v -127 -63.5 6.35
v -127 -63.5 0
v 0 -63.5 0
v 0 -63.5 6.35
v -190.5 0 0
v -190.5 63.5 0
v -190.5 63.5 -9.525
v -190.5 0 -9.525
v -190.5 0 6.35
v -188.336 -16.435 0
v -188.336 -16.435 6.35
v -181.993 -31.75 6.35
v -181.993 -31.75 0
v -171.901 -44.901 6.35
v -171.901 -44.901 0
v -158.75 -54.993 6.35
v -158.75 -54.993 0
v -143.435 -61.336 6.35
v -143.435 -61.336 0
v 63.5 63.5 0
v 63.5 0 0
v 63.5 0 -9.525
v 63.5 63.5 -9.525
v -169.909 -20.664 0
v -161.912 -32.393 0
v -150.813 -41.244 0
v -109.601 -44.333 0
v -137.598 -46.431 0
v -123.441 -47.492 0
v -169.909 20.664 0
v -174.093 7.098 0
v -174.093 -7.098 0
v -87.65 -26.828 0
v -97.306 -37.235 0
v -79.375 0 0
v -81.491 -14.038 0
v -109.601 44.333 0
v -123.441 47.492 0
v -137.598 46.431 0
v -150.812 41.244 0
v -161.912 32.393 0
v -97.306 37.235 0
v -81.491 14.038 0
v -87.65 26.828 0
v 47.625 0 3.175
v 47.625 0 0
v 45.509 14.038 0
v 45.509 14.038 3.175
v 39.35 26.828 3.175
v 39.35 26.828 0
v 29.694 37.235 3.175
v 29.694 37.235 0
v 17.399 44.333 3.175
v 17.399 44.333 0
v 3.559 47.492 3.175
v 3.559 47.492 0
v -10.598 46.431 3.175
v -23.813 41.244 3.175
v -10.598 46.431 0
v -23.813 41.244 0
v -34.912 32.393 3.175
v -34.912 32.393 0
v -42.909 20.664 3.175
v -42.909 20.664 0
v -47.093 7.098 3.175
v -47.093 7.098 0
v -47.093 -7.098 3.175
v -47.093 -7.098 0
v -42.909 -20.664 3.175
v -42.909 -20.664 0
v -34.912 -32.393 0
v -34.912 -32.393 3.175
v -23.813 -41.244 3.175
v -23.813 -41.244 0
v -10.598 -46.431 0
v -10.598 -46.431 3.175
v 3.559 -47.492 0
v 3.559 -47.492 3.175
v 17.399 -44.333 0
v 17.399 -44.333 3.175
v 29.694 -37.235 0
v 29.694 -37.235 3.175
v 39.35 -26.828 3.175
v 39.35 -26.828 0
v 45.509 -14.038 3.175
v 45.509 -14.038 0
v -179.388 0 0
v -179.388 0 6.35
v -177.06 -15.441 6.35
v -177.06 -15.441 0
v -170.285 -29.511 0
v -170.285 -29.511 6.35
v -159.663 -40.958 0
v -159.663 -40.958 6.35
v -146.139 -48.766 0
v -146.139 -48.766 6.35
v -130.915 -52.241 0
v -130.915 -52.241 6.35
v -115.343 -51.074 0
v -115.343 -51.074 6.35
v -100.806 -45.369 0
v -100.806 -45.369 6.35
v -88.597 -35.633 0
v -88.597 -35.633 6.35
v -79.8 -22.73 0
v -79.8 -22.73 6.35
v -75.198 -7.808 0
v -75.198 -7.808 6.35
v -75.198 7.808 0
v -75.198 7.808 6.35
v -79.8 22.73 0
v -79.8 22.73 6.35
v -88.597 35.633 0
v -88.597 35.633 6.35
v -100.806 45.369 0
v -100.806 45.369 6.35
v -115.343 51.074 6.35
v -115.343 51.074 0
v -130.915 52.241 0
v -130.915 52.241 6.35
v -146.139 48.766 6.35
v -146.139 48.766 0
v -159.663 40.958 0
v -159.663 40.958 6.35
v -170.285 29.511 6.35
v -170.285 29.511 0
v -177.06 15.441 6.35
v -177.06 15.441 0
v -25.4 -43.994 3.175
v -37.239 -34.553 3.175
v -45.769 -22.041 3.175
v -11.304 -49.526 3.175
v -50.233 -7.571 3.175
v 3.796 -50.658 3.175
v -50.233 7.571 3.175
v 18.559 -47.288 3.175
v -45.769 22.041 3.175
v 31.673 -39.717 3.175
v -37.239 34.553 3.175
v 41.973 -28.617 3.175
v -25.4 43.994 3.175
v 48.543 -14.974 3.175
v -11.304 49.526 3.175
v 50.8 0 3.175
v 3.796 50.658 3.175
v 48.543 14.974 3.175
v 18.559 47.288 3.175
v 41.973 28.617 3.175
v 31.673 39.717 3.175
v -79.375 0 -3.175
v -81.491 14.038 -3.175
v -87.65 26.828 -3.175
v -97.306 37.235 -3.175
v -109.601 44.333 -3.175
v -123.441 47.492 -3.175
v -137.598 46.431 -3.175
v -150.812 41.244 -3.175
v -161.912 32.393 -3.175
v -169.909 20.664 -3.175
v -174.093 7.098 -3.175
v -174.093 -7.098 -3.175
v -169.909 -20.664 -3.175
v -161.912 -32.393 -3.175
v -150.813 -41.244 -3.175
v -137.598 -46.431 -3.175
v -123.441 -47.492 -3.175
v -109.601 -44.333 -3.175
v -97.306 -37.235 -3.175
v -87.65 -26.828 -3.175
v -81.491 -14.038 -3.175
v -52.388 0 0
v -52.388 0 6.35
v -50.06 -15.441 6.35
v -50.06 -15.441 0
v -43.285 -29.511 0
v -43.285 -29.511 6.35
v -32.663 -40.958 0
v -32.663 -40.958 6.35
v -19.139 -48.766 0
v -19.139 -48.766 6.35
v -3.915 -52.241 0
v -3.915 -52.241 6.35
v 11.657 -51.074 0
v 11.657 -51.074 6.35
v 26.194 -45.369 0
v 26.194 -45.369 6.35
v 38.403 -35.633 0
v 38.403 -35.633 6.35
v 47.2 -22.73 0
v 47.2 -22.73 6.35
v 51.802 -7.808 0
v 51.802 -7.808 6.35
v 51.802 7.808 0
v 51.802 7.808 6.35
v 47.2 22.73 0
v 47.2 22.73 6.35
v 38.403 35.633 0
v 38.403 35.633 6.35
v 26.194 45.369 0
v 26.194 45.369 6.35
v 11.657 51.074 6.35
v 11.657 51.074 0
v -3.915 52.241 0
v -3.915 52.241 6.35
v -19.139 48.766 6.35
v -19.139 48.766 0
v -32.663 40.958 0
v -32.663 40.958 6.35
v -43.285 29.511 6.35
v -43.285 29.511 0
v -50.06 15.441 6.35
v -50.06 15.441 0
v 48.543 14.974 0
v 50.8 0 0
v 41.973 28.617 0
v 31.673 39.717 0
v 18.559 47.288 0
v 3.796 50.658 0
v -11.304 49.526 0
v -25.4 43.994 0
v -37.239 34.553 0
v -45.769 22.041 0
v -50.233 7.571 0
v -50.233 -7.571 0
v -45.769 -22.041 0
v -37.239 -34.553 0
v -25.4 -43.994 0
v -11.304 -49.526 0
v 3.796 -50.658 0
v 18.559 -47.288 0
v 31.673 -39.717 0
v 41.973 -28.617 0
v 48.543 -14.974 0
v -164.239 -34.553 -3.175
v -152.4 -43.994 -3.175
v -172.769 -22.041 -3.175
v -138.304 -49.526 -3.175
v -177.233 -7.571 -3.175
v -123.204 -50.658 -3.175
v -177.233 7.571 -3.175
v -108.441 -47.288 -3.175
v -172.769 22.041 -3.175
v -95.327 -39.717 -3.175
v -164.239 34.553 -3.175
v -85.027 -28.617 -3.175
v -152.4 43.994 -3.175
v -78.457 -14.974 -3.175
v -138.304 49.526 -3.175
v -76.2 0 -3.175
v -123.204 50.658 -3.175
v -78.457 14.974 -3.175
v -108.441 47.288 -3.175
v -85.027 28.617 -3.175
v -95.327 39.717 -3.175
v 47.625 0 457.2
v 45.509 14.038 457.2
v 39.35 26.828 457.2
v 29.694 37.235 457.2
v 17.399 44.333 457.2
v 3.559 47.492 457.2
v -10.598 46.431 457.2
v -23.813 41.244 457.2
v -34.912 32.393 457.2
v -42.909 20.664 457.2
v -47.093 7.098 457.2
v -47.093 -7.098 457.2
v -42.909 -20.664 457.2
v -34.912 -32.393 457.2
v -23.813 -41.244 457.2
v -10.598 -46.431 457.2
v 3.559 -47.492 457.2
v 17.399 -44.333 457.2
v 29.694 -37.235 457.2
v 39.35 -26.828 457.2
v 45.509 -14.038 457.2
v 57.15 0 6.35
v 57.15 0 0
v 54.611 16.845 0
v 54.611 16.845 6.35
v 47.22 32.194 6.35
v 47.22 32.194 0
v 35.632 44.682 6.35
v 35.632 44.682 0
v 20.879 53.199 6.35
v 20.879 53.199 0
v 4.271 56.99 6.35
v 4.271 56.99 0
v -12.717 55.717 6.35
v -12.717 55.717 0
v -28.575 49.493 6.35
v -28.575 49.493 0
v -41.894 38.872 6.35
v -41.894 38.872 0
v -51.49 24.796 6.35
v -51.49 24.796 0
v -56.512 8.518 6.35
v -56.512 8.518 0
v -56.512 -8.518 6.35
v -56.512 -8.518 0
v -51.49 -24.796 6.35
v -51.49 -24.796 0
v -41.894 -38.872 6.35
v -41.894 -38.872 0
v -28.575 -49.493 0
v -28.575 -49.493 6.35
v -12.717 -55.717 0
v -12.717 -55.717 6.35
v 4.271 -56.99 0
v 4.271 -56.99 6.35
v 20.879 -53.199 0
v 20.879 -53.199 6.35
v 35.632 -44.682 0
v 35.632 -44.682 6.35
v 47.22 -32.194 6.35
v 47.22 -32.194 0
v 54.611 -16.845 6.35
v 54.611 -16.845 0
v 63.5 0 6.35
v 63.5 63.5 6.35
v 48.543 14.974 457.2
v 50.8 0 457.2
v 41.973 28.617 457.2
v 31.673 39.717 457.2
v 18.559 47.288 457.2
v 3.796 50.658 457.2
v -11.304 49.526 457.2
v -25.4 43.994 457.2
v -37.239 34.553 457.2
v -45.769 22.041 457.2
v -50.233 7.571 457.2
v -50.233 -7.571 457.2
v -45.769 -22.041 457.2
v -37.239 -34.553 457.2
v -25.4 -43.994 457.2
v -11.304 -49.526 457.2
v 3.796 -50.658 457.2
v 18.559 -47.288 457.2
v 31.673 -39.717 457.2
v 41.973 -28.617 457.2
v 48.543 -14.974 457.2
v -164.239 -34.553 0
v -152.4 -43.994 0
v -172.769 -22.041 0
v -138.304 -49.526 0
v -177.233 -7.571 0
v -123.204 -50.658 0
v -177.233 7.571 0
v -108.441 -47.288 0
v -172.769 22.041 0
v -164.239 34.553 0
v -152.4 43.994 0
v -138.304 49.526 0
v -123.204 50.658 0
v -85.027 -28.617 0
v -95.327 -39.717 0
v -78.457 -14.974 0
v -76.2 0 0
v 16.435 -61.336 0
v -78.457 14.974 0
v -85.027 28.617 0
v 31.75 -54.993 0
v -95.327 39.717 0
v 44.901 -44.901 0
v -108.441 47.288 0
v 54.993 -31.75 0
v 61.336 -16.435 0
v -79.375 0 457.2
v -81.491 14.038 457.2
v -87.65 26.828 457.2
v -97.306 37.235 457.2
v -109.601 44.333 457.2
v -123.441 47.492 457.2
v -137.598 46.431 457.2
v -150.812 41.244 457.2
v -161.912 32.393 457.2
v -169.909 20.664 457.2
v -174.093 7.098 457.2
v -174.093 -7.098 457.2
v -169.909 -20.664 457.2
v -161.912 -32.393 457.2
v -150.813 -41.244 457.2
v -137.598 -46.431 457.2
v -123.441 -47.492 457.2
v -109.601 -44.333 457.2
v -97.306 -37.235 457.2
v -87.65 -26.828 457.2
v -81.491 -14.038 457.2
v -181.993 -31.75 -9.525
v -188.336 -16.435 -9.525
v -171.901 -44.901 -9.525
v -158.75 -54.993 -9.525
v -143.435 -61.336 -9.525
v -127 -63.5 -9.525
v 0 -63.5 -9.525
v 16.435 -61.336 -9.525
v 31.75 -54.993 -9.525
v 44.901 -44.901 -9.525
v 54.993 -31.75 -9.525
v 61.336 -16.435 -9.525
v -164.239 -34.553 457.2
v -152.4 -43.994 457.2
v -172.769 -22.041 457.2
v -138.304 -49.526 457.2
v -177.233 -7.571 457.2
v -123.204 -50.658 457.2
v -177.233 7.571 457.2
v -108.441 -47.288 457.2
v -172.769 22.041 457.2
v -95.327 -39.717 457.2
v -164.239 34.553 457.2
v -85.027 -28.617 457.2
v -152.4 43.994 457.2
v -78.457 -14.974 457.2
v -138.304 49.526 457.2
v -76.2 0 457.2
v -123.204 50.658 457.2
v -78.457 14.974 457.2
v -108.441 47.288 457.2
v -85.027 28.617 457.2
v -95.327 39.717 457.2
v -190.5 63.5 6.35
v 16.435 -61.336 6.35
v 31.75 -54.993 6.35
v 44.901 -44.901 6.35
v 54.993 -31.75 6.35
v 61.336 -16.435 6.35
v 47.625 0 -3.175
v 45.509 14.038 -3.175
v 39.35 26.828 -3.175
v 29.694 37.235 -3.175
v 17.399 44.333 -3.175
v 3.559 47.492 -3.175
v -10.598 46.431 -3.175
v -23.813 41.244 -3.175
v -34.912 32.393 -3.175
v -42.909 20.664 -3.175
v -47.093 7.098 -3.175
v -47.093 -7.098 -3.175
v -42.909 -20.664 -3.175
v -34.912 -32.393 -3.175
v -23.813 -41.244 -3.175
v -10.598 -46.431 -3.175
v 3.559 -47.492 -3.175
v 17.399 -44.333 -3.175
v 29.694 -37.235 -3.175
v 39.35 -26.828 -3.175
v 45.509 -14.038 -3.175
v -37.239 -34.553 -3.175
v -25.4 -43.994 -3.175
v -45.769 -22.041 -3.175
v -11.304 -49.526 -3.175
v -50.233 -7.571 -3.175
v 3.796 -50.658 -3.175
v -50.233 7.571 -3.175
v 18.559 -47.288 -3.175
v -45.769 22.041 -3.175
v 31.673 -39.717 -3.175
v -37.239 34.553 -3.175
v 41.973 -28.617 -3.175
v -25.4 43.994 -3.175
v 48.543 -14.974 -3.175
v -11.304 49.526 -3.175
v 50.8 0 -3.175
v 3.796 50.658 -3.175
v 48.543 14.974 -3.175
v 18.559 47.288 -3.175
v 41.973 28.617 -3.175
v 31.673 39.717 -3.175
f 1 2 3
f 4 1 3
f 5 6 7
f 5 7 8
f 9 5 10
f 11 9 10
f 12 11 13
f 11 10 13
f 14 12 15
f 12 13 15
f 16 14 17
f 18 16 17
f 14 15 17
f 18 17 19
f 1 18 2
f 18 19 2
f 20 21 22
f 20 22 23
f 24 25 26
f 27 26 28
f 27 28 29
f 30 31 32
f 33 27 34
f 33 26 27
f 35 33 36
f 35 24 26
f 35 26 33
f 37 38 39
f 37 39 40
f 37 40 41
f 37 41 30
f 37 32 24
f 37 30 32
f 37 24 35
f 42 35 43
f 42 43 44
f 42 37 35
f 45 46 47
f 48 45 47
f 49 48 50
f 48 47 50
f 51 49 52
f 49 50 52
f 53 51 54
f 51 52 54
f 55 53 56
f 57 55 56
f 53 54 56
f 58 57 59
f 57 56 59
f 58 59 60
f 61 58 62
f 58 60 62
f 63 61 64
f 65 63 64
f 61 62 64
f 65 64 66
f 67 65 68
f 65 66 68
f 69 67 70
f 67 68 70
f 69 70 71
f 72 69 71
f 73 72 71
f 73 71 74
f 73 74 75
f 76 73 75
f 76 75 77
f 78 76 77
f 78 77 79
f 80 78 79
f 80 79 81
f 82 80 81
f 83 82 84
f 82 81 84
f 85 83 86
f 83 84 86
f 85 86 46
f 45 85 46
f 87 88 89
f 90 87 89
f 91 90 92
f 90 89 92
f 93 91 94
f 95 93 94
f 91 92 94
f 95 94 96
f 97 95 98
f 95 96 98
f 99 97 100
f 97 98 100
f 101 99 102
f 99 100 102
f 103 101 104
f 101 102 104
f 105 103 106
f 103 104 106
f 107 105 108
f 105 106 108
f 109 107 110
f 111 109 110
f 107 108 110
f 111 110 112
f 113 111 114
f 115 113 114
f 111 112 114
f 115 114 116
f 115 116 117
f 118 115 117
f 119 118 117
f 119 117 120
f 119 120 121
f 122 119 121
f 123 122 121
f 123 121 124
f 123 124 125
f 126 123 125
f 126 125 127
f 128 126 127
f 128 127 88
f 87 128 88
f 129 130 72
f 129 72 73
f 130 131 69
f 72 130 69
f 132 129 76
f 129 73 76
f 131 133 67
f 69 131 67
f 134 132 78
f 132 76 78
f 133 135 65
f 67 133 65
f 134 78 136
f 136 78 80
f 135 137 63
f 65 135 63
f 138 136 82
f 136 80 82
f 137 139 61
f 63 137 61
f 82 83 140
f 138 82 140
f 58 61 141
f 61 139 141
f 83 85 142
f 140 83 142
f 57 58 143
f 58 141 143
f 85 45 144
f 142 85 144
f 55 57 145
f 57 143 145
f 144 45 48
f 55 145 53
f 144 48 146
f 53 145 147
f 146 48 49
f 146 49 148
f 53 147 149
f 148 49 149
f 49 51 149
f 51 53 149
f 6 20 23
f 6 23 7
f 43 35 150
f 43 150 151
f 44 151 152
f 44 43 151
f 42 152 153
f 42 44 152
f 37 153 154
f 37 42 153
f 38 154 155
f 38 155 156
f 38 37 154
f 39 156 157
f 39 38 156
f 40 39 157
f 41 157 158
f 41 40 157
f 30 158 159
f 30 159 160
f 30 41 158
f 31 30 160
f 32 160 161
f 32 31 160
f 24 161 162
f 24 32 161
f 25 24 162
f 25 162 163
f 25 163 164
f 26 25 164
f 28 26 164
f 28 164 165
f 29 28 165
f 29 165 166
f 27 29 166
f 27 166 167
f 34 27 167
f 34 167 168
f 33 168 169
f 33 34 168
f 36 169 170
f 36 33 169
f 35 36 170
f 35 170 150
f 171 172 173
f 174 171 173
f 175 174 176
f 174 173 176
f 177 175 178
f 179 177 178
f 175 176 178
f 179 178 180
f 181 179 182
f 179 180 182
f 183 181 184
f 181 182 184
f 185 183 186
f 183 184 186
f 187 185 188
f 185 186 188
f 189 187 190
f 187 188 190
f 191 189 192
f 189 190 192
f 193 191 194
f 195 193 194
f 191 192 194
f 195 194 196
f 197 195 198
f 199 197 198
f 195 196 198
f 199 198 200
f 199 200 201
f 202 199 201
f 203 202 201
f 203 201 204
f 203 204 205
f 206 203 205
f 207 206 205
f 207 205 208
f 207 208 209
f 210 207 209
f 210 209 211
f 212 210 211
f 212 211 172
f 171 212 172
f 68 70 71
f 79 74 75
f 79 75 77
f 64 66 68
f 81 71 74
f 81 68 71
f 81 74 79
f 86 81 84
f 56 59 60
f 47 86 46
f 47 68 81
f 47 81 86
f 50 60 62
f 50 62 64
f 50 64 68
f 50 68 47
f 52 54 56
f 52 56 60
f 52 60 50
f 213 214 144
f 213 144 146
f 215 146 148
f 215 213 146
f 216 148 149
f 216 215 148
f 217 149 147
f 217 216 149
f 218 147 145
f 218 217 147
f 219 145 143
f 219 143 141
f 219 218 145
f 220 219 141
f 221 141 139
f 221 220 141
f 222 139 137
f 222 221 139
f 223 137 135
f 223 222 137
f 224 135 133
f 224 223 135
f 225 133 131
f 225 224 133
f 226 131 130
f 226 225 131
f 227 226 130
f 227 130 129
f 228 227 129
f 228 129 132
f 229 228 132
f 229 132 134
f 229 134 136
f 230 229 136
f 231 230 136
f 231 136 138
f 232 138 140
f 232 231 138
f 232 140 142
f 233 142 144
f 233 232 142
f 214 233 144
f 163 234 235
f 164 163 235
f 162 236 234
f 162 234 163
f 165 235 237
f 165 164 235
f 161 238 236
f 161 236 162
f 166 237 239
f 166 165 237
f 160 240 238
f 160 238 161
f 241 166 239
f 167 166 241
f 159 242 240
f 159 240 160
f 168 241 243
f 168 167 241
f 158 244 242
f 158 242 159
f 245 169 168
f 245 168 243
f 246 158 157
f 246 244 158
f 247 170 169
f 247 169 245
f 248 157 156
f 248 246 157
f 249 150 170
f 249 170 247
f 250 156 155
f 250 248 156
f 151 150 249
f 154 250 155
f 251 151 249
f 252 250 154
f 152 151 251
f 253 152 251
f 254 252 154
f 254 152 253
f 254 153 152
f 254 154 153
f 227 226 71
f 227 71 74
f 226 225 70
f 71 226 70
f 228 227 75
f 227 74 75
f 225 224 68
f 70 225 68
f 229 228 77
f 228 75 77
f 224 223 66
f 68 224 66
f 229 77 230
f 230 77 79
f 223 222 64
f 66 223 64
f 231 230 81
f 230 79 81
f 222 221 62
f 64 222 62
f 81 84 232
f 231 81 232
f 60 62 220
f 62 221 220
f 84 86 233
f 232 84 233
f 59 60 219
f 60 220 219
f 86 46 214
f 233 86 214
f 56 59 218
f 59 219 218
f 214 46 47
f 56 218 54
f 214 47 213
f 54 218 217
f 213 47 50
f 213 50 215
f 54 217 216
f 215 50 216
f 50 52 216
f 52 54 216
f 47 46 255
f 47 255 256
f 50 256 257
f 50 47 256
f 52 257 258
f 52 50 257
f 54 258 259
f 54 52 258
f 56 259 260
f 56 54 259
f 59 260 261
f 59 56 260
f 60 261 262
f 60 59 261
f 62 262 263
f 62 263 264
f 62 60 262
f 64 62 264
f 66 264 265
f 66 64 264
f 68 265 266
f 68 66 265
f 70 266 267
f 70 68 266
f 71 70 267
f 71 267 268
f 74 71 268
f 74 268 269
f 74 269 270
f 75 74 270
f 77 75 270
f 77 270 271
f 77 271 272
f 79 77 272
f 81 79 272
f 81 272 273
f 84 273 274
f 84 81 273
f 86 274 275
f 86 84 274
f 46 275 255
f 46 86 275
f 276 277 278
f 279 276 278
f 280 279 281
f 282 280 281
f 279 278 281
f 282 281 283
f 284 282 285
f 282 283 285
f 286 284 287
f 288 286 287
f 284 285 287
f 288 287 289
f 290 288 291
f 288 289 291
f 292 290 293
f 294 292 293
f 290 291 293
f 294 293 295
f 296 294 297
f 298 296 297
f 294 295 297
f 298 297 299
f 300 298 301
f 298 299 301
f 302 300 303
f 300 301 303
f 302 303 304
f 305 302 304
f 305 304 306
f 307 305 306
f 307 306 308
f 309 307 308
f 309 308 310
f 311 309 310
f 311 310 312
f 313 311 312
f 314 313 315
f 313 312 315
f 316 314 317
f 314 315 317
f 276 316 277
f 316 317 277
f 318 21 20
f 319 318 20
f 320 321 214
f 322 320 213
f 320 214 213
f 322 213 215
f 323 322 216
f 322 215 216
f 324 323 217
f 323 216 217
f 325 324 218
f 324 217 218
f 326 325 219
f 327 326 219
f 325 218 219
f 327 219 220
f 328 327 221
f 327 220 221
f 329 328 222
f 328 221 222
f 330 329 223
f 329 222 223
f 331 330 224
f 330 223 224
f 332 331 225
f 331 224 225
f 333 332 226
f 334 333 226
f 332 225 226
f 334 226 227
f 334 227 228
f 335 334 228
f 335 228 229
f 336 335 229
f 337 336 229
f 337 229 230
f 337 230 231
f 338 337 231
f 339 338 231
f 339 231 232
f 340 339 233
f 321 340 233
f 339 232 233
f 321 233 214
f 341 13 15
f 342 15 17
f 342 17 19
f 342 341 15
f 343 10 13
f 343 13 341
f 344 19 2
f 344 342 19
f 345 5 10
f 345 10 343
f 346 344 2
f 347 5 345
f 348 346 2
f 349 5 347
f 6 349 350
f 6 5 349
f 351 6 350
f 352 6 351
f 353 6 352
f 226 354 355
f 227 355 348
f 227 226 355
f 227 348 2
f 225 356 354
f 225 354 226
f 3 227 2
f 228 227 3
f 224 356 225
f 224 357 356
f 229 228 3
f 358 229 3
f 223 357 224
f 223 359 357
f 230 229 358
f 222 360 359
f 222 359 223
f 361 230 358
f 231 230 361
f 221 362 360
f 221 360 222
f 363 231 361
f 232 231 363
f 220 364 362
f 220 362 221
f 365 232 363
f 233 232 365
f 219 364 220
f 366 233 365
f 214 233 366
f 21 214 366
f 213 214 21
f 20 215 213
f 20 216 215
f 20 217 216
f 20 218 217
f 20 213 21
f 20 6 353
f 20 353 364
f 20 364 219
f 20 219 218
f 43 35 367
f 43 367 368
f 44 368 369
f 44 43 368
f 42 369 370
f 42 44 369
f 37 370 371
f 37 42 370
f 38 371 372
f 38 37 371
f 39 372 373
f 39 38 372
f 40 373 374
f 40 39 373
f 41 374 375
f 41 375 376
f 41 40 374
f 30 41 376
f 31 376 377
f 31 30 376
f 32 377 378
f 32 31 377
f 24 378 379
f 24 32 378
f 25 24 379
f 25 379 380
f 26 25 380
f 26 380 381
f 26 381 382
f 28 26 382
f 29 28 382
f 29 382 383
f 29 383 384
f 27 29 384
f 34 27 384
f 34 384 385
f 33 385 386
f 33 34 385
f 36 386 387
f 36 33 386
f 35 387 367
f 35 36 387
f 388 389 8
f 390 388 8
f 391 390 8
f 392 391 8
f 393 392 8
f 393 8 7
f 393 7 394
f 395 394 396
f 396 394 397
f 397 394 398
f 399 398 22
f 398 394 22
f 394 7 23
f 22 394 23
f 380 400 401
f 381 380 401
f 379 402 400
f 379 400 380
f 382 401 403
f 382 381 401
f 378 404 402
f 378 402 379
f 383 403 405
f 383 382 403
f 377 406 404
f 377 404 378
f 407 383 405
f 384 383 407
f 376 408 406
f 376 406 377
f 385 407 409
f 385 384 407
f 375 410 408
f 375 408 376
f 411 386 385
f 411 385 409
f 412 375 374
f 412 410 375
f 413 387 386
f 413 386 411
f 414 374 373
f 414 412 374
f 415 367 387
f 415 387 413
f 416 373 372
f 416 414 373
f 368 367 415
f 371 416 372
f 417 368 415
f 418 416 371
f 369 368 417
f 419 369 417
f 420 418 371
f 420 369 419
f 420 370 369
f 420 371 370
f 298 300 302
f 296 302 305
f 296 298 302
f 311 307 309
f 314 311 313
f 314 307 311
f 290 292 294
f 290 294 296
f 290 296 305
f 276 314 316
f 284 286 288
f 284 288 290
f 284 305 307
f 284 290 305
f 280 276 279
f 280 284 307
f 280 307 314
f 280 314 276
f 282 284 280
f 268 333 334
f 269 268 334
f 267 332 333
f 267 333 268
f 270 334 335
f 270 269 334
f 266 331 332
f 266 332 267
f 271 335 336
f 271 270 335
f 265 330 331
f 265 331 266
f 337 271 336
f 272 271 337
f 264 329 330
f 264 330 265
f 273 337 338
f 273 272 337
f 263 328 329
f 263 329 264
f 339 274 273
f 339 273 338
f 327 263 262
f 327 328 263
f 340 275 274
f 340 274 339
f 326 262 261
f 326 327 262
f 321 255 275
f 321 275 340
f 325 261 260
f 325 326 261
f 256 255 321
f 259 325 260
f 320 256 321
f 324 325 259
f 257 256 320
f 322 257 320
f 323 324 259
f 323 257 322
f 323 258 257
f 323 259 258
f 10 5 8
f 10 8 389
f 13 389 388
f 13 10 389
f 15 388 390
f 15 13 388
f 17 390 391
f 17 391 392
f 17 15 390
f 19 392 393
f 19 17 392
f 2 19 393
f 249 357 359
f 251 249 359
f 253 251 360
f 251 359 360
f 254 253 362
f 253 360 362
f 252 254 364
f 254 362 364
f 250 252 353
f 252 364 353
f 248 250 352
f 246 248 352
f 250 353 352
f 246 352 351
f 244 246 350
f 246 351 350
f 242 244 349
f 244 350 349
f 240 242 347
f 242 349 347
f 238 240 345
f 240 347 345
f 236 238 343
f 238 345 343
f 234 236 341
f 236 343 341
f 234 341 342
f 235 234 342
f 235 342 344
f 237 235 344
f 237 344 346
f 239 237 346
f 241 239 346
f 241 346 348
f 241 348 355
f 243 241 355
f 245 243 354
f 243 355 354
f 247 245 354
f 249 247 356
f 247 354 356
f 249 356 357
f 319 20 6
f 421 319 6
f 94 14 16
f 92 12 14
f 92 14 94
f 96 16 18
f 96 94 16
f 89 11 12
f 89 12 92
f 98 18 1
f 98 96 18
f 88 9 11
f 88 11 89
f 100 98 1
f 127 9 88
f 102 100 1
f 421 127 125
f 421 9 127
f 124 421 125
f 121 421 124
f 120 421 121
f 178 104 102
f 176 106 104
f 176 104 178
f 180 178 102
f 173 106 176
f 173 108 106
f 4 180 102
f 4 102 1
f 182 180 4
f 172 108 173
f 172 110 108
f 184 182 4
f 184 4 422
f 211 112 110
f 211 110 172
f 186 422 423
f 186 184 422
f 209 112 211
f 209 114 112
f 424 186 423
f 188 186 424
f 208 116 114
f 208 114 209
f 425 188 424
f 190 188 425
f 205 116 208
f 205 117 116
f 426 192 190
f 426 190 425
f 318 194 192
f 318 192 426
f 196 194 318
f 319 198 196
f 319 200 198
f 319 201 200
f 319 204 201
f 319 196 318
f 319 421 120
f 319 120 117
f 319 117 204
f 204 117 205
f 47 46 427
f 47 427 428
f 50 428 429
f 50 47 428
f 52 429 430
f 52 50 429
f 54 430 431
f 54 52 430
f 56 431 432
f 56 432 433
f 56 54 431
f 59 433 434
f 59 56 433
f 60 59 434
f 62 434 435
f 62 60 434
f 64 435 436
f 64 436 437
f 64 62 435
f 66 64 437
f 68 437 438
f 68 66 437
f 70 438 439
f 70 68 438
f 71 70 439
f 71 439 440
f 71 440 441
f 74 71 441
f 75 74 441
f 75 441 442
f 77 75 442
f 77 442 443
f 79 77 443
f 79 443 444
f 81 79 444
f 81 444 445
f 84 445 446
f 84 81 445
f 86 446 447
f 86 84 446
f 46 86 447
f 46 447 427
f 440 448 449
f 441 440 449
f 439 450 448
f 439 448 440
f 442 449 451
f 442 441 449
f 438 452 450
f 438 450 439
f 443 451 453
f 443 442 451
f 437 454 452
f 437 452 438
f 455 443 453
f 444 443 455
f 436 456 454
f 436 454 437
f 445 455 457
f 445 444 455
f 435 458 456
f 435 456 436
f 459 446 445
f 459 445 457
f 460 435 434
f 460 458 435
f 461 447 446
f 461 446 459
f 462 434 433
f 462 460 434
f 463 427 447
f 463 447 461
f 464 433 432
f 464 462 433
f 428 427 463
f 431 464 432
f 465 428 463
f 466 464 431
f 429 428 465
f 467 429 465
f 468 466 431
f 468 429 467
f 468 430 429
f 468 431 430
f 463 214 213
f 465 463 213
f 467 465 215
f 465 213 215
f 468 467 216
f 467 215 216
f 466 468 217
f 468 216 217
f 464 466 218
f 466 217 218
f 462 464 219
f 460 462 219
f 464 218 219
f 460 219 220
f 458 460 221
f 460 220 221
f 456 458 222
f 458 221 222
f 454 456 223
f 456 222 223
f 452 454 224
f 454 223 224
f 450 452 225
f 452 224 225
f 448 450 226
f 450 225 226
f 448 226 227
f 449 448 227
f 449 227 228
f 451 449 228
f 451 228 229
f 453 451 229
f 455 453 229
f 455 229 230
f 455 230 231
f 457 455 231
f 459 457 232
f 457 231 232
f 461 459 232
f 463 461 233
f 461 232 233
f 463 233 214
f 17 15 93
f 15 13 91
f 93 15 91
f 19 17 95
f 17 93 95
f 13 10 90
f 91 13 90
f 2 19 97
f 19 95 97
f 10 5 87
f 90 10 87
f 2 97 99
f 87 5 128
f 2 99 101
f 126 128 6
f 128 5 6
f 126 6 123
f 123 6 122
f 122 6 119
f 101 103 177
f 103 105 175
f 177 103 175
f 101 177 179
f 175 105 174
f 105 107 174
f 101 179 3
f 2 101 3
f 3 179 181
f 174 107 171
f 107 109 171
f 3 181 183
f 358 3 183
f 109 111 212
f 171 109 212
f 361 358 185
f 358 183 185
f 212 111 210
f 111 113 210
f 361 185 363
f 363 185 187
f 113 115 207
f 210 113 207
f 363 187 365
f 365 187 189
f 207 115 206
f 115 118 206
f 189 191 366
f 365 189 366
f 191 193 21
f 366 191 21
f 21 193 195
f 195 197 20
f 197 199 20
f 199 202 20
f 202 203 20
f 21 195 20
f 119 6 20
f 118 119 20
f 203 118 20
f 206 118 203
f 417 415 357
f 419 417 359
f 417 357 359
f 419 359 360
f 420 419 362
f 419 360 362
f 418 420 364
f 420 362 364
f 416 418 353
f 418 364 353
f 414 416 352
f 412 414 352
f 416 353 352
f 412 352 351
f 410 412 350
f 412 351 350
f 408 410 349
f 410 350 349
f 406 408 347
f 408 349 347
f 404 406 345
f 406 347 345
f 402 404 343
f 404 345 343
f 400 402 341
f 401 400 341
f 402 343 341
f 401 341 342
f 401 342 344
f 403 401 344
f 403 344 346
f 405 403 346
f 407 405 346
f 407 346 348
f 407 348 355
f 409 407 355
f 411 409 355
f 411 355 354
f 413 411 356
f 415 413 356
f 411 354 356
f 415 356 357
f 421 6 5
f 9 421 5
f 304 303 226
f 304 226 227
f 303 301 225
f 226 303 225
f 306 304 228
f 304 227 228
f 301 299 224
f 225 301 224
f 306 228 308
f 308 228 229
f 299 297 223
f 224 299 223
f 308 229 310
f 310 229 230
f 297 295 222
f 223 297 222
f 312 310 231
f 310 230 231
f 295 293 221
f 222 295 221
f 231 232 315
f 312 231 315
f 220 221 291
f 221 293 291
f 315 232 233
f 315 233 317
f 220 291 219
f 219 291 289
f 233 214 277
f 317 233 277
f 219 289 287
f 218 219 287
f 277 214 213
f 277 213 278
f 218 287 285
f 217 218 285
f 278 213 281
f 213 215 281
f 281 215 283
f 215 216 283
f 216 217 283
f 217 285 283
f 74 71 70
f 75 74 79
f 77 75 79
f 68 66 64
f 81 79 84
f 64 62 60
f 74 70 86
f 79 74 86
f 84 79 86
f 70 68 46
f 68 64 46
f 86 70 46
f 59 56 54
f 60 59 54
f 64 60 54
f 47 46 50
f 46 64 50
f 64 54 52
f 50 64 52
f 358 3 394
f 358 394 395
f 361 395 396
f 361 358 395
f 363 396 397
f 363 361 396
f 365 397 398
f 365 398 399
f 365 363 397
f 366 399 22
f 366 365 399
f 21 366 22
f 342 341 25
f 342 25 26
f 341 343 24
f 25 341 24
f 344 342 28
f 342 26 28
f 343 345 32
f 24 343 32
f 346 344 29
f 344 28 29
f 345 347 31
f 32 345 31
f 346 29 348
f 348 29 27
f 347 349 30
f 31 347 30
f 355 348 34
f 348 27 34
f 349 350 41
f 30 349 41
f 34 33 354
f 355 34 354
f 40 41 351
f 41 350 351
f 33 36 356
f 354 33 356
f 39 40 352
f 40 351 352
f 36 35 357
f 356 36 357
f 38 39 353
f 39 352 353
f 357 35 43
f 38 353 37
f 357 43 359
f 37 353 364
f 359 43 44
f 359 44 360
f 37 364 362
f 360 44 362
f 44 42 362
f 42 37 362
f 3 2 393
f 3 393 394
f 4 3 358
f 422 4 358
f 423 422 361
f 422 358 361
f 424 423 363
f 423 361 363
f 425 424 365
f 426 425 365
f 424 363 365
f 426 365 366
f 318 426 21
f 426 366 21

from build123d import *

# Parameters (mm, degrees)
F0_R     = 57.15
F1_DEPTH = 6.35
F2_DEPTH = 25.4
F4_DEPTH = 9.525
F5_R     = 50.8
F5_R_2   = 47.625
F6_DEPTH = 457.2
F7_DEPTH = 3.175
F8_DEPTH = 3.175
F9_DEPTH = 6.35
F10_D    = 104.775


# Not quite as in the source:
# - a feature names something its author has since deleted; it is built from what else it names


with BuildPart() as f1:
    # F0 (on Top) → F1 (new body)
    with BuildSketch(Plane.XY):
        Circle(F0_R)
    extrude(amount=F1_DEPTH)

    # F2 (cut): a face of the model
    f2_faces = [f1.faces().sort_by_distance(p)[0] for p in [
        (0, 0, 6.35),
    ]]
    extrude(f2_faces, amount=F2_DEPTH, mode=Mode.SUBTRACT)

    # F5 (on Top) → F7 (cut)
    with BuildSketch(Plane.XY):
        Circle(F5_R)
        Circle(F5_R_2, mode=Mode.SUBTRACT)
        with Locations((-127, 0)):
            Circle(F5_R)
        with Locations((-127, 0)):
            Circle(F5_R_2, mode=Mode.SUBTRACT)
    extrude(amount=F7_DEPTH, mode=Mode.SUBTRACT)


with BuildPart() as f4:
    # F3 (on Top) → F4 (new body)
    with BuildSketch(Plane.XY):
        with BuildLine():
            Line((-190.5, 63.5), (-190.5, 0))
            ThreePointArc((-190.5, 0), (-171.9012806053, -44.9012806053), (-127, -63.5))
            Line((-127, -63.5), (0, -63.5))
            ThreePointArc((0, -63.5), (44.9012806053, -44.9012806053), (63.5, 0))
            Line((63.5, 0), (63.5, 63.5))
            Line((63.5, 63.5), (-190.5, 63.5))
        make_face()
    extrude(amount=-F4_DEPTH)

    # F5 (on Top) → F8 (cut)
    with BuildSketch(Plane.XY):
        Circle(F5_R)
        Circle(F5_R_2, mode=Mode.SUBTRACT)
        with Locations((-127, 0)):
            Circle(F5_R)
        with Locations((-127, 0)):
            Circle(F5_R_2, mode=Mode.SUBTRACT)
    extrude(amount=-F8_DEPTH, mode=Mode.SUBTRACT)


with BuildPart() as f6:
    # F5 (on Top) → F6 (new body)
    with BuildSketch(Plane.XY):
        Circle(F5_R)
        Circle(F5_R_2, mode=Mode.SUBTRACT)
    extrude(amount=F6_DEPTH)


with BuildPart() as f6b:
    # F5 (on Top) → F6, piece 2 (new body)
    with BuildSketch(Plane.XY):
        with Locations((-127, 0)):
            Circle(F5_R)
        with Locations((-127, 0)):
            Circle(F5_R_2, mode=Mode.SUBTRACT)
    extrude(amount=F6_DEPTH)


with BuildPart() as f9:
    # F3 (on Top) → F9 (new body)
    with BuildSketch(Plane.XY):
        with BuildLine():
            Line((-190.5, 63.5), (-190.5, 0))
            ThreePointArc((-190.5, 0), (-171.9012806053, -44.9012806053), (-127, -63.5))
            Line((-127, -63.5), (0, -63.5))
            ThreePointArc((0, -63.5), (44.9012806053, -44.9012806053), (63.5, 0))
            Line((63.5, 0), (63.5, 63.5))
            Line((63.5, 63.5), (-190.5, 63.5))
        make_face()
    extrude(amount=F9_DEPTH)

    # F10 (through all)
    with Locations(Plane(origin=(0, 0, 0), x_dir=(1, 0, 0), z_dir=(0, 0, -1))):
        with Locations((-127, 0), (0, 0)):
            Hole(F10_D / 2)


solid = Compound([f1.part, f4.part, f6.part, f6b.part, f9.part])
